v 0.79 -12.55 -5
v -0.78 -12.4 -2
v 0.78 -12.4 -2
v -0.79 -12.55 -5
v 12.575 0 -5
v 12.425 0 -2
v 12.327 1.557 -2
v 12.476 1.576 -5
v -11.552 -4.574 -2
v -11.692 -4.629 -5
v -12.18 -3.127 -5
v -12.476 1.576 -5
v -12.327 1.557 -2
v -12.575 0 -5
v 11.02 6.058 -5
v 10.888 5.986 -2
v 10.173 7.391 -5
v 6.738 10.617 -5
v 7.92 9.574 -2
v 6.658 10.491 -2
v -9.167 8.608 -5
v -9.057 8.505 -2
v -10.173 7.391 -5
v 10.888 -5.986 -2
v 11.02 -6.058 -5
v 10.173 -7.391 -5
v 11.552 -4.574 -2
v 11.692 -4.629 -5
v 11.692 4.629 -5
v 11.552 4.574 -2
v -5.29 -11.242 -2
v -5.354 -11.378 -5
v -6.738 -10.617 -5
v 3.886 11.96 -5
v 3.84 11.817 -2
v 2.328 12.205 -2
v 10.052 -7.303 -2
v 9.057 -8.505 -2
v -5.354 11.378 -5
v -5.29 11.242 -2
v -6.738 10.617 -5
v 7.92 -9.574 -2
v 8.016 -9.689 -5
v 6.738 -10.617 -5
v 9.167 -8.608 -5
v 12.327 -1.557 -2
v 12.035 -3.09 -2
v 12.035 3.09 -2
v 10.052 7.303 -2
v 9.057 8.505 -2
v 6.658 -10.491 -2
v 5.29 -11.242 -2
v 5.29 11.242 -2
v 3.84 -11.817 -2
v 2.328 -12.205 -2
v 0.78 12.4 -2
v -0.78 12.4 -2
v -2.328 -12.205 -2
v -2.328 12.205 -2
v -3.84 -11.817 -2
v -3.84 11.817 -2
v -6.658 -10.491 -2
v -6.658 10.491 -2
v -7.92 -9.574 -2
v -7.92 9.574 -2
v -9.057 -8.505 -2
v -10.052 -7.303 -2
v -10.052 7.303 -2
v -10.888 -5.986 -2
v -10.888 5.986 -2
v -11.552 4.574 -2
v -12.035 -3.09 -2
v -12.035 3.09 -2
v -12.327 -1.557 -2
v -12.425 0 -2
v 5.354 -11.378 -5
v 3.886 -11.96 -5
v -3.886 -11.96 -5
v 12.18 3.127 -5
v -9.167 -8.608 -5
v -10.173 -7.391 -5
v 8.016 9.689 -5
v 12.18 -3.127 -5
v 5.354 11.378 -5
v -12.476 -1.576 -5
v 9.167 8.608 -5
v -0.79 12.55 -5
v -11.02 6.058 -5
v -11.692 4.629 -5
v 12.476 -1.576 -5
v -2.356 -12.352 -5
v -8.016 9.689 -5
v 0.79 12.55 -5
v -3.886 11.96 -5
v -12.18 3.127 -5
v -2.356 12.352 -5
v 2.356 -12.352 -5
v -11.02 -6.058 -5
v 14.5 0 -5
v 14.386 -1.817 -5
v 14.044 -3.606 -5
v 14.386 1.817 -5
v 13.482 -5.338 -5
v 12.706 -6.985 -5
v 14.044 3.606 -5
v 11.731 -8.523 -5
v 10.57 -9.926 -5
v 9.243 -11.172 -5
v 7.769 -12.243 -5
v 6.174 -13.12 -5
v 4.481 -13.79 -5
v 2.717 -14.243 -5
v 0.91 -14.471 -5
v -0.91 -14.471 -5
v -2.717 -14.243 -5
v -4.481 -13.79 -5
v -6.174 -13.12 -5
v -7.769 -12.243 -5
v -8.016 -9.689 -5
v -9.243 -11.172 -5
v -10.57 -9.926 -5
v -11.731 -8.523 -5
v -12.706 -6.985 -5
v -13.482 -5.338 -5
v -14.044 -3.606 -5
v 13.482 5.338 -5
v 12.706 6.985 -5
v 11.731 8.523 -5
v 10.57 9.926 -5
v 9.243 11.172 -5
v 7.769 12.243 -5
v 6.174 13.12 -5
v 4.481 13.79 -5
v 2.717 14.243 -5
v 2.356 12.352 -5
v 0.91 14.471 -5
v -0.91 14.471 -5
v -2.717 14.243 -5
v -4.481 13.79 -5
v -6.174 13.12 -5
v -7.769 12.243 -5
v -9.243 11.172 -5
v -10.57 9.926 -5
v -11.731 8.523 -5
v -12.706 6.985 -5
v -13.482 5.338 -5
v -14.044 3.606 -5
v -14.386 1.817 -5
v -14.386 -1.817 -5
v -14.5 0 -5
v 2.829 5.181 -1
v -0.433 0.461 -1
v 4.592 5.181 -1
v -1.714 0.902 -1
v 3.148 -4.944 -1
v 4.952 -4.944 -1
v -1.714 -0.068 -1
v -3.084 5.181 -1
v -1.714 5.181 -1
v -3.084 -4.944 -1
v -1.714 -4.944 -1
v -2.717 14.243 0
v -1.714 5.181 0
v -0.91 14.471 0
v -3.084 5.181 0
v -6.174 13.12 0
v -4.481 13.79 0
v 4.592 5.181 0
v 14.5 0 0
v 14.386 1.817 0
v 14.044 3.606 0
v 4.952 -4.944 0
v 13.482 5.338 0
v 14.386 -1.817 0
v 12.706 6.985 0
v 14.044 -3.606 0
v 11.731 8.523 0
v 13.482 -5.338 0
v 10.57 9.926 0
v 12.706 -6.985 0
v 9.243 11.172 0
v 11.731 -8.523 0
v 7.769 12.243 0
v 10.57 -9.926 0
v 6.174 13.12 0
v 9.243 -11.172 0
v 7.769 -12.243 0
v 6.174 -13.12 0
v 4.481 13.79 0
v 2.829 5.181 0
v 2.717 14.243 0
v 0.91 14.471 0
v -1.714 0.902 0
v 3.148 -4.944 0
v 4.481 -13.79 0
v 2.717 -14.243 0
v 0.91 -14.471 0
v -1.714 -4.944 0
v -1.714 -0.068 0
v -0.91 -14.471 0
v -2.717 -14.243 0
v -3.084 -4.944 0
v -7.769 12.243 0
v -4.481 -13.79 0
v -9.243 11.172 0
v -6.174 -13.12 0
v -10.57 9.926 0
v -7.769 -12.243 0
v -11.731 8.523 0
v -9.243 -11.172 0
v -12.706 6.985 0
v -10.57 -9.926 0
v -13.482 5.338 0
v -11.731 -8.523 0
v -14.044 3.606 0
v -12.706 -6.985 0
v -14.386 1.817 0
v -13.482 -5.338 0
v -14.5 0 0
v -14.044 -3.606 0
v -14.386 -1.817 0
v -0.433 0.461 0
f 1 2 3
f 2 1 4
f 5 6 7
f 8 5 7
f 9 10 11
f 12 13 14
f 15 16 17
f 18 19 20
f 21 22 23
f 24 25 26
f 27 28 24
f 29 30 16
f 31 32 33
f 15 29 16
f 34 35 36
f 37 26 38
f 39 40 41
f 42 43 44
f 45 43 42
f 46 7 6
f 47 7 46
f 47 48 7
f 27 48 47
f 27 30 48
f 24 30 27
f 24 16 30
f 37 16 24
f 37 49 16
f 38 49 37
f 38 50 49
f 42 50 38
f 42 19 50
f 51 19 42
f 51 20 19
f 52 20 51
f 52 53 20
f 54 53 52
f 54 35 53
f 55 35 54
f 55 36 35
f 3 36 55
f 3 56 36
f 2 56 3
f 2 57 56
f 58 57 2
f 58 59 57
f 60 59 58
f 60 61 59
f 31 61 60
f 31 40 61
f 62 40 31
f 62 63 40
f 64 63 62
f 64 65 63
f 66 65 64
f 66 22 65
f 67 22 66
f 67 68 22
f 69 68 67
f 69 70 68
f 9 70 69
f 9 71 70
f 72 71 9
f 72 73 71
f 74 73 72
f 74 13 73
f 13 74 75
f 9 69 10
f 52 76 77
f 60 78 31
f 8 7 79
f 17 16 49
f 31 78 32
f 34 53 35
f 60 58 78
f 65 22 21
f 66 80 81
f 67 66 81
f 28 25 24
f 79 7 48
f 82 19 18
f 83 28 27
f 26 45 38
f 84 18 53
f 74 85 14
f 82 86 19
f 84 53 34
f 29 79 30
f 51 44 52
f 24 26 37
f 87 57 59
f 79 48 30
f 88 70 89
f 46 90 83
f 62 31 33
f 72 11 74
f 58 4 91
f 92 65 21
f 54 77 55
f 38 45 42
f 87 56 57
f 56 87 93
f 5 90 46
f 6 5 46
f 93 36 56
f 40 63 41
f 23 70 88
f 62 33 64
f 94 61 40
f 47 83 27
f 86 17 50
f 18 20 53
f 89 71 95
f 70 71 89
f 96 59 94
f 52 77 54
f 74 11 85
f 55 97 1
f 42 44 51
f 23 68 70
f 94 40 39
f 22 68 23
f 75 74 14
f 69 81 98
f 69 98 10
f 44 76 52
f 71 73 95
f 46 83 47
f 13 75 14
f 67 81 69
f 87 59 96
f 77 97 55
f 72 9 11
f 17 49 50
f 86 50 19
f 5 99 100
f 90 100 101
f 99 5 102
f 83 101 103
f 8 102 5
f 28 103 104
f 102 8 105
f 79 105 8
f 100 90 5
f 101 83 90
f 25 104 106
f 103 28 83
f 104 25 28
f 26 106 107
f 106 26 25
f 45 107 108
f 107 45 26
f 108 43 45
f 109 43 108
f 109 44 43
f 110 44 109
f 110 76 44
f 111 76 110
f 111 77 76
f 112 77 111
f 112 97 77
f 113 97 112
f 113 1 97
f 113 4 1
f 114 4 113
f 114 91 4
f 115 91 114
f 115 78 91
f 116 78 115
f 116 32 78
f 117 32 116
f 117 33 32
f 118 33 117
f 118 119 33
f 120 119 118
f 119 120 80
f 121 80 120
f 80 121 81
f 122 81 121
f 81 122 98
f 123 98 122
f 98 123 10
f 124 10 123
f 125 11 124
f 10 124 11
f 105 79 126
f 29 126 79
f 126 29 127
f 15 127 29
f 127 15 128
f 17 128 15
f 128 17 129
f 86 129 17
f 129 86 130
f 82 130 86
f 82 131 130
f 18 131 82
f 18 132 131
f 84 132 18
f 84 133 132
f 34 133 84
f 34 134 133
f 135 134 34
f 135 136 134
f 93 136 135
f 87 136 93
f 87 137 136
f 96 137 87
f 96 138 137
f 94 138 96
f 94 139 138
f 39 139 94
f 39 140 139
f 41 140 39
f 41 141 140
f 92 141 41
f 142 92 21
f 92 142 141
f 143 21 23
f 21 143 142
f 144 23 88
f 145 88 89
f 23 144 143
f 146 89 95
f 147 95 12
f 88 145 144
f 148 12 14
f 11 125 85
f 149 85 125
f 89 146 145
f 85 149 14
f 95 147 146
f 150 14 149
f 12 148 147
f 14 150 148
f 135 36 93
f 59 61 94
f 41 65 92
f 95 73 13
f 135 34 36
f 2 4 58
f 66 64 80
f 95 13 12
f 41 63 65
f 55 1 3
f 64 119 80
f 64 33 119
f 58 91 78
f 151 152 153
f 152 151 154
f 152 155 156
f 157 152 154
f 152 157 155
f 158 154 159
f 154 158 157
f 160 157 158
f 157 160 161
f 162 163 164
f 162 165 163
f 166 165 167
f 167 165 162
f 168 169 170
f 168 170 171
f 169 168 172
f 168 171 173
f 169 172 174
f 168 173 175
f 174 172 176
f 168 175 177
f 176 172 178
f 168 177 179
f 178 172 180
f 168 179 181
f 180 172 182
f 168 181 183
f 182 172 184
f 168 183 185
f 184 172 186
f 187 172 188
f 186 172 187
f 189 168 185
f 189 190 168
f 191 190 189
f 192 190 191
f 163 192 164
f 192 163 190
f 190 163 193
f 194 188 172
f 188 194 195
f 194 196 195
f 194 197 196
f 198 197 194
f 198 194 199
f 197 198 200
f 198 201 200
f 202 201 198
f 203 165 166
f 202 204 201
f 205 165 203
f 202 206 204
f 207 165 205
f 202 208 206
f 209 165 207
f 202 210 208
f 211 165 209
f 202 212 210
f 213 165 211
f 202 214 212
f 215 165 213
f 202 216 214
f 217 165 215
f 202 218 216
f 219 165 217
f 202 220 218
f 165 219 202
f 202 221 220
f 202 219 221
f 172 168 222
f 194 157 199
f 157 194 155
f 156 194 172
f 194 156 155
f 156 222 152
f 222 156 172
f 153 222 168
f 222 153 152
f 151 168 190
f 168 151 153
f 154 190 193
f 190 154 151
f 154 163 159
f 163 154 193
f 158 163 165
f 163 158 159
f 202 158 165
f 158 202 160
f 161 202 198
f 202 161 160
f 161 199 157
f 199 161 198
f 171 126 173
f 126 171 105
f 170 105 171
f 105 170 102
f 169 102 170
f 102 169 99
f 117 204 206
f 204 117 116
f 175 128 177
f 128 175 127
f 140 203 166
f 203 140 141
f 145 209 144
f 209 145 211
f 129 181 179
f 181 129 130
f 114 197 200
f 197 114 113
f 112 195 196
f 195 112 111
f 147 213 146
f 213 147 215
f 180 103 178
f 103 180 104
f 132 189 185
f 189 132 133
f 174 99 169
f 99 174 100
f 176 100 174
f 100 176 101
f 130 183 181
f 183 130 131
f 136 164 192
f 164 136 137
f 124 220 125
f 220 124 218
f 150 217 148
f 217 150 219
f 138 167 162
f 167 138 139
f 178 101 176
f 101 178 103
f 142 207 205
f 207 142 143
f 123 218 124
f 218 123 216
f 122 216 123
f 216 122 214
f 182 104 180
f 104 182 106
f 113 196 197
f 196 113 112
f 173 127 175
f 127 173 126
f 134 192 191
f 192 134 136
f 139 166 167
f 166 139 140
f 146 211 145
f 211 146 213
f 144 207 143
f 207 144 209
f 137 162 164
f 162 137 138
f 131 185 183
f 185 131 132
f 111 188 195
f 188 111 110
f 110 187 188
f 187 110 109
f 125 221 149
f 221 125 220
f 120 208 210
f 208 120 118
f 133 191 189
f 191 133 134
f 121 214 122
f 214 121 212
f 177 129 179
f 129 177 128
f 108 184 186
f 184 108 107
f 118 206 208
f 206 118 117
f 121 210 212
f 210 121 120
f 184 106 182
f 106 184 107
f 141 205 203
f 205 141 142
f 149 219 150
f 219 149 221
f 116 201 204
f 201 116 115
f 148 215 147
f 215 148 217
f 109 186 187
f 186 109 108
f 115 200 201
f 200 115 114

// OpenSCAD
$fn = 50;

difference() {
	union() {
		translate(v = [0, 0, -5.0]) {
			cylinder(h = 5, r = 14.5);
		}
	}
	union() {
		#translate(v = [0, 0, -5.0]) {
			cylinder(h = 3, r1 = 12.575, r2 = 12.425);
		}
		translate(v = [0, 0, -1]) {
			linear_extrude(height = 1) {
				text(font = "Impact", halign = "center", size = 10, text = "K", valign = "center");
			}
		}
	}
}
